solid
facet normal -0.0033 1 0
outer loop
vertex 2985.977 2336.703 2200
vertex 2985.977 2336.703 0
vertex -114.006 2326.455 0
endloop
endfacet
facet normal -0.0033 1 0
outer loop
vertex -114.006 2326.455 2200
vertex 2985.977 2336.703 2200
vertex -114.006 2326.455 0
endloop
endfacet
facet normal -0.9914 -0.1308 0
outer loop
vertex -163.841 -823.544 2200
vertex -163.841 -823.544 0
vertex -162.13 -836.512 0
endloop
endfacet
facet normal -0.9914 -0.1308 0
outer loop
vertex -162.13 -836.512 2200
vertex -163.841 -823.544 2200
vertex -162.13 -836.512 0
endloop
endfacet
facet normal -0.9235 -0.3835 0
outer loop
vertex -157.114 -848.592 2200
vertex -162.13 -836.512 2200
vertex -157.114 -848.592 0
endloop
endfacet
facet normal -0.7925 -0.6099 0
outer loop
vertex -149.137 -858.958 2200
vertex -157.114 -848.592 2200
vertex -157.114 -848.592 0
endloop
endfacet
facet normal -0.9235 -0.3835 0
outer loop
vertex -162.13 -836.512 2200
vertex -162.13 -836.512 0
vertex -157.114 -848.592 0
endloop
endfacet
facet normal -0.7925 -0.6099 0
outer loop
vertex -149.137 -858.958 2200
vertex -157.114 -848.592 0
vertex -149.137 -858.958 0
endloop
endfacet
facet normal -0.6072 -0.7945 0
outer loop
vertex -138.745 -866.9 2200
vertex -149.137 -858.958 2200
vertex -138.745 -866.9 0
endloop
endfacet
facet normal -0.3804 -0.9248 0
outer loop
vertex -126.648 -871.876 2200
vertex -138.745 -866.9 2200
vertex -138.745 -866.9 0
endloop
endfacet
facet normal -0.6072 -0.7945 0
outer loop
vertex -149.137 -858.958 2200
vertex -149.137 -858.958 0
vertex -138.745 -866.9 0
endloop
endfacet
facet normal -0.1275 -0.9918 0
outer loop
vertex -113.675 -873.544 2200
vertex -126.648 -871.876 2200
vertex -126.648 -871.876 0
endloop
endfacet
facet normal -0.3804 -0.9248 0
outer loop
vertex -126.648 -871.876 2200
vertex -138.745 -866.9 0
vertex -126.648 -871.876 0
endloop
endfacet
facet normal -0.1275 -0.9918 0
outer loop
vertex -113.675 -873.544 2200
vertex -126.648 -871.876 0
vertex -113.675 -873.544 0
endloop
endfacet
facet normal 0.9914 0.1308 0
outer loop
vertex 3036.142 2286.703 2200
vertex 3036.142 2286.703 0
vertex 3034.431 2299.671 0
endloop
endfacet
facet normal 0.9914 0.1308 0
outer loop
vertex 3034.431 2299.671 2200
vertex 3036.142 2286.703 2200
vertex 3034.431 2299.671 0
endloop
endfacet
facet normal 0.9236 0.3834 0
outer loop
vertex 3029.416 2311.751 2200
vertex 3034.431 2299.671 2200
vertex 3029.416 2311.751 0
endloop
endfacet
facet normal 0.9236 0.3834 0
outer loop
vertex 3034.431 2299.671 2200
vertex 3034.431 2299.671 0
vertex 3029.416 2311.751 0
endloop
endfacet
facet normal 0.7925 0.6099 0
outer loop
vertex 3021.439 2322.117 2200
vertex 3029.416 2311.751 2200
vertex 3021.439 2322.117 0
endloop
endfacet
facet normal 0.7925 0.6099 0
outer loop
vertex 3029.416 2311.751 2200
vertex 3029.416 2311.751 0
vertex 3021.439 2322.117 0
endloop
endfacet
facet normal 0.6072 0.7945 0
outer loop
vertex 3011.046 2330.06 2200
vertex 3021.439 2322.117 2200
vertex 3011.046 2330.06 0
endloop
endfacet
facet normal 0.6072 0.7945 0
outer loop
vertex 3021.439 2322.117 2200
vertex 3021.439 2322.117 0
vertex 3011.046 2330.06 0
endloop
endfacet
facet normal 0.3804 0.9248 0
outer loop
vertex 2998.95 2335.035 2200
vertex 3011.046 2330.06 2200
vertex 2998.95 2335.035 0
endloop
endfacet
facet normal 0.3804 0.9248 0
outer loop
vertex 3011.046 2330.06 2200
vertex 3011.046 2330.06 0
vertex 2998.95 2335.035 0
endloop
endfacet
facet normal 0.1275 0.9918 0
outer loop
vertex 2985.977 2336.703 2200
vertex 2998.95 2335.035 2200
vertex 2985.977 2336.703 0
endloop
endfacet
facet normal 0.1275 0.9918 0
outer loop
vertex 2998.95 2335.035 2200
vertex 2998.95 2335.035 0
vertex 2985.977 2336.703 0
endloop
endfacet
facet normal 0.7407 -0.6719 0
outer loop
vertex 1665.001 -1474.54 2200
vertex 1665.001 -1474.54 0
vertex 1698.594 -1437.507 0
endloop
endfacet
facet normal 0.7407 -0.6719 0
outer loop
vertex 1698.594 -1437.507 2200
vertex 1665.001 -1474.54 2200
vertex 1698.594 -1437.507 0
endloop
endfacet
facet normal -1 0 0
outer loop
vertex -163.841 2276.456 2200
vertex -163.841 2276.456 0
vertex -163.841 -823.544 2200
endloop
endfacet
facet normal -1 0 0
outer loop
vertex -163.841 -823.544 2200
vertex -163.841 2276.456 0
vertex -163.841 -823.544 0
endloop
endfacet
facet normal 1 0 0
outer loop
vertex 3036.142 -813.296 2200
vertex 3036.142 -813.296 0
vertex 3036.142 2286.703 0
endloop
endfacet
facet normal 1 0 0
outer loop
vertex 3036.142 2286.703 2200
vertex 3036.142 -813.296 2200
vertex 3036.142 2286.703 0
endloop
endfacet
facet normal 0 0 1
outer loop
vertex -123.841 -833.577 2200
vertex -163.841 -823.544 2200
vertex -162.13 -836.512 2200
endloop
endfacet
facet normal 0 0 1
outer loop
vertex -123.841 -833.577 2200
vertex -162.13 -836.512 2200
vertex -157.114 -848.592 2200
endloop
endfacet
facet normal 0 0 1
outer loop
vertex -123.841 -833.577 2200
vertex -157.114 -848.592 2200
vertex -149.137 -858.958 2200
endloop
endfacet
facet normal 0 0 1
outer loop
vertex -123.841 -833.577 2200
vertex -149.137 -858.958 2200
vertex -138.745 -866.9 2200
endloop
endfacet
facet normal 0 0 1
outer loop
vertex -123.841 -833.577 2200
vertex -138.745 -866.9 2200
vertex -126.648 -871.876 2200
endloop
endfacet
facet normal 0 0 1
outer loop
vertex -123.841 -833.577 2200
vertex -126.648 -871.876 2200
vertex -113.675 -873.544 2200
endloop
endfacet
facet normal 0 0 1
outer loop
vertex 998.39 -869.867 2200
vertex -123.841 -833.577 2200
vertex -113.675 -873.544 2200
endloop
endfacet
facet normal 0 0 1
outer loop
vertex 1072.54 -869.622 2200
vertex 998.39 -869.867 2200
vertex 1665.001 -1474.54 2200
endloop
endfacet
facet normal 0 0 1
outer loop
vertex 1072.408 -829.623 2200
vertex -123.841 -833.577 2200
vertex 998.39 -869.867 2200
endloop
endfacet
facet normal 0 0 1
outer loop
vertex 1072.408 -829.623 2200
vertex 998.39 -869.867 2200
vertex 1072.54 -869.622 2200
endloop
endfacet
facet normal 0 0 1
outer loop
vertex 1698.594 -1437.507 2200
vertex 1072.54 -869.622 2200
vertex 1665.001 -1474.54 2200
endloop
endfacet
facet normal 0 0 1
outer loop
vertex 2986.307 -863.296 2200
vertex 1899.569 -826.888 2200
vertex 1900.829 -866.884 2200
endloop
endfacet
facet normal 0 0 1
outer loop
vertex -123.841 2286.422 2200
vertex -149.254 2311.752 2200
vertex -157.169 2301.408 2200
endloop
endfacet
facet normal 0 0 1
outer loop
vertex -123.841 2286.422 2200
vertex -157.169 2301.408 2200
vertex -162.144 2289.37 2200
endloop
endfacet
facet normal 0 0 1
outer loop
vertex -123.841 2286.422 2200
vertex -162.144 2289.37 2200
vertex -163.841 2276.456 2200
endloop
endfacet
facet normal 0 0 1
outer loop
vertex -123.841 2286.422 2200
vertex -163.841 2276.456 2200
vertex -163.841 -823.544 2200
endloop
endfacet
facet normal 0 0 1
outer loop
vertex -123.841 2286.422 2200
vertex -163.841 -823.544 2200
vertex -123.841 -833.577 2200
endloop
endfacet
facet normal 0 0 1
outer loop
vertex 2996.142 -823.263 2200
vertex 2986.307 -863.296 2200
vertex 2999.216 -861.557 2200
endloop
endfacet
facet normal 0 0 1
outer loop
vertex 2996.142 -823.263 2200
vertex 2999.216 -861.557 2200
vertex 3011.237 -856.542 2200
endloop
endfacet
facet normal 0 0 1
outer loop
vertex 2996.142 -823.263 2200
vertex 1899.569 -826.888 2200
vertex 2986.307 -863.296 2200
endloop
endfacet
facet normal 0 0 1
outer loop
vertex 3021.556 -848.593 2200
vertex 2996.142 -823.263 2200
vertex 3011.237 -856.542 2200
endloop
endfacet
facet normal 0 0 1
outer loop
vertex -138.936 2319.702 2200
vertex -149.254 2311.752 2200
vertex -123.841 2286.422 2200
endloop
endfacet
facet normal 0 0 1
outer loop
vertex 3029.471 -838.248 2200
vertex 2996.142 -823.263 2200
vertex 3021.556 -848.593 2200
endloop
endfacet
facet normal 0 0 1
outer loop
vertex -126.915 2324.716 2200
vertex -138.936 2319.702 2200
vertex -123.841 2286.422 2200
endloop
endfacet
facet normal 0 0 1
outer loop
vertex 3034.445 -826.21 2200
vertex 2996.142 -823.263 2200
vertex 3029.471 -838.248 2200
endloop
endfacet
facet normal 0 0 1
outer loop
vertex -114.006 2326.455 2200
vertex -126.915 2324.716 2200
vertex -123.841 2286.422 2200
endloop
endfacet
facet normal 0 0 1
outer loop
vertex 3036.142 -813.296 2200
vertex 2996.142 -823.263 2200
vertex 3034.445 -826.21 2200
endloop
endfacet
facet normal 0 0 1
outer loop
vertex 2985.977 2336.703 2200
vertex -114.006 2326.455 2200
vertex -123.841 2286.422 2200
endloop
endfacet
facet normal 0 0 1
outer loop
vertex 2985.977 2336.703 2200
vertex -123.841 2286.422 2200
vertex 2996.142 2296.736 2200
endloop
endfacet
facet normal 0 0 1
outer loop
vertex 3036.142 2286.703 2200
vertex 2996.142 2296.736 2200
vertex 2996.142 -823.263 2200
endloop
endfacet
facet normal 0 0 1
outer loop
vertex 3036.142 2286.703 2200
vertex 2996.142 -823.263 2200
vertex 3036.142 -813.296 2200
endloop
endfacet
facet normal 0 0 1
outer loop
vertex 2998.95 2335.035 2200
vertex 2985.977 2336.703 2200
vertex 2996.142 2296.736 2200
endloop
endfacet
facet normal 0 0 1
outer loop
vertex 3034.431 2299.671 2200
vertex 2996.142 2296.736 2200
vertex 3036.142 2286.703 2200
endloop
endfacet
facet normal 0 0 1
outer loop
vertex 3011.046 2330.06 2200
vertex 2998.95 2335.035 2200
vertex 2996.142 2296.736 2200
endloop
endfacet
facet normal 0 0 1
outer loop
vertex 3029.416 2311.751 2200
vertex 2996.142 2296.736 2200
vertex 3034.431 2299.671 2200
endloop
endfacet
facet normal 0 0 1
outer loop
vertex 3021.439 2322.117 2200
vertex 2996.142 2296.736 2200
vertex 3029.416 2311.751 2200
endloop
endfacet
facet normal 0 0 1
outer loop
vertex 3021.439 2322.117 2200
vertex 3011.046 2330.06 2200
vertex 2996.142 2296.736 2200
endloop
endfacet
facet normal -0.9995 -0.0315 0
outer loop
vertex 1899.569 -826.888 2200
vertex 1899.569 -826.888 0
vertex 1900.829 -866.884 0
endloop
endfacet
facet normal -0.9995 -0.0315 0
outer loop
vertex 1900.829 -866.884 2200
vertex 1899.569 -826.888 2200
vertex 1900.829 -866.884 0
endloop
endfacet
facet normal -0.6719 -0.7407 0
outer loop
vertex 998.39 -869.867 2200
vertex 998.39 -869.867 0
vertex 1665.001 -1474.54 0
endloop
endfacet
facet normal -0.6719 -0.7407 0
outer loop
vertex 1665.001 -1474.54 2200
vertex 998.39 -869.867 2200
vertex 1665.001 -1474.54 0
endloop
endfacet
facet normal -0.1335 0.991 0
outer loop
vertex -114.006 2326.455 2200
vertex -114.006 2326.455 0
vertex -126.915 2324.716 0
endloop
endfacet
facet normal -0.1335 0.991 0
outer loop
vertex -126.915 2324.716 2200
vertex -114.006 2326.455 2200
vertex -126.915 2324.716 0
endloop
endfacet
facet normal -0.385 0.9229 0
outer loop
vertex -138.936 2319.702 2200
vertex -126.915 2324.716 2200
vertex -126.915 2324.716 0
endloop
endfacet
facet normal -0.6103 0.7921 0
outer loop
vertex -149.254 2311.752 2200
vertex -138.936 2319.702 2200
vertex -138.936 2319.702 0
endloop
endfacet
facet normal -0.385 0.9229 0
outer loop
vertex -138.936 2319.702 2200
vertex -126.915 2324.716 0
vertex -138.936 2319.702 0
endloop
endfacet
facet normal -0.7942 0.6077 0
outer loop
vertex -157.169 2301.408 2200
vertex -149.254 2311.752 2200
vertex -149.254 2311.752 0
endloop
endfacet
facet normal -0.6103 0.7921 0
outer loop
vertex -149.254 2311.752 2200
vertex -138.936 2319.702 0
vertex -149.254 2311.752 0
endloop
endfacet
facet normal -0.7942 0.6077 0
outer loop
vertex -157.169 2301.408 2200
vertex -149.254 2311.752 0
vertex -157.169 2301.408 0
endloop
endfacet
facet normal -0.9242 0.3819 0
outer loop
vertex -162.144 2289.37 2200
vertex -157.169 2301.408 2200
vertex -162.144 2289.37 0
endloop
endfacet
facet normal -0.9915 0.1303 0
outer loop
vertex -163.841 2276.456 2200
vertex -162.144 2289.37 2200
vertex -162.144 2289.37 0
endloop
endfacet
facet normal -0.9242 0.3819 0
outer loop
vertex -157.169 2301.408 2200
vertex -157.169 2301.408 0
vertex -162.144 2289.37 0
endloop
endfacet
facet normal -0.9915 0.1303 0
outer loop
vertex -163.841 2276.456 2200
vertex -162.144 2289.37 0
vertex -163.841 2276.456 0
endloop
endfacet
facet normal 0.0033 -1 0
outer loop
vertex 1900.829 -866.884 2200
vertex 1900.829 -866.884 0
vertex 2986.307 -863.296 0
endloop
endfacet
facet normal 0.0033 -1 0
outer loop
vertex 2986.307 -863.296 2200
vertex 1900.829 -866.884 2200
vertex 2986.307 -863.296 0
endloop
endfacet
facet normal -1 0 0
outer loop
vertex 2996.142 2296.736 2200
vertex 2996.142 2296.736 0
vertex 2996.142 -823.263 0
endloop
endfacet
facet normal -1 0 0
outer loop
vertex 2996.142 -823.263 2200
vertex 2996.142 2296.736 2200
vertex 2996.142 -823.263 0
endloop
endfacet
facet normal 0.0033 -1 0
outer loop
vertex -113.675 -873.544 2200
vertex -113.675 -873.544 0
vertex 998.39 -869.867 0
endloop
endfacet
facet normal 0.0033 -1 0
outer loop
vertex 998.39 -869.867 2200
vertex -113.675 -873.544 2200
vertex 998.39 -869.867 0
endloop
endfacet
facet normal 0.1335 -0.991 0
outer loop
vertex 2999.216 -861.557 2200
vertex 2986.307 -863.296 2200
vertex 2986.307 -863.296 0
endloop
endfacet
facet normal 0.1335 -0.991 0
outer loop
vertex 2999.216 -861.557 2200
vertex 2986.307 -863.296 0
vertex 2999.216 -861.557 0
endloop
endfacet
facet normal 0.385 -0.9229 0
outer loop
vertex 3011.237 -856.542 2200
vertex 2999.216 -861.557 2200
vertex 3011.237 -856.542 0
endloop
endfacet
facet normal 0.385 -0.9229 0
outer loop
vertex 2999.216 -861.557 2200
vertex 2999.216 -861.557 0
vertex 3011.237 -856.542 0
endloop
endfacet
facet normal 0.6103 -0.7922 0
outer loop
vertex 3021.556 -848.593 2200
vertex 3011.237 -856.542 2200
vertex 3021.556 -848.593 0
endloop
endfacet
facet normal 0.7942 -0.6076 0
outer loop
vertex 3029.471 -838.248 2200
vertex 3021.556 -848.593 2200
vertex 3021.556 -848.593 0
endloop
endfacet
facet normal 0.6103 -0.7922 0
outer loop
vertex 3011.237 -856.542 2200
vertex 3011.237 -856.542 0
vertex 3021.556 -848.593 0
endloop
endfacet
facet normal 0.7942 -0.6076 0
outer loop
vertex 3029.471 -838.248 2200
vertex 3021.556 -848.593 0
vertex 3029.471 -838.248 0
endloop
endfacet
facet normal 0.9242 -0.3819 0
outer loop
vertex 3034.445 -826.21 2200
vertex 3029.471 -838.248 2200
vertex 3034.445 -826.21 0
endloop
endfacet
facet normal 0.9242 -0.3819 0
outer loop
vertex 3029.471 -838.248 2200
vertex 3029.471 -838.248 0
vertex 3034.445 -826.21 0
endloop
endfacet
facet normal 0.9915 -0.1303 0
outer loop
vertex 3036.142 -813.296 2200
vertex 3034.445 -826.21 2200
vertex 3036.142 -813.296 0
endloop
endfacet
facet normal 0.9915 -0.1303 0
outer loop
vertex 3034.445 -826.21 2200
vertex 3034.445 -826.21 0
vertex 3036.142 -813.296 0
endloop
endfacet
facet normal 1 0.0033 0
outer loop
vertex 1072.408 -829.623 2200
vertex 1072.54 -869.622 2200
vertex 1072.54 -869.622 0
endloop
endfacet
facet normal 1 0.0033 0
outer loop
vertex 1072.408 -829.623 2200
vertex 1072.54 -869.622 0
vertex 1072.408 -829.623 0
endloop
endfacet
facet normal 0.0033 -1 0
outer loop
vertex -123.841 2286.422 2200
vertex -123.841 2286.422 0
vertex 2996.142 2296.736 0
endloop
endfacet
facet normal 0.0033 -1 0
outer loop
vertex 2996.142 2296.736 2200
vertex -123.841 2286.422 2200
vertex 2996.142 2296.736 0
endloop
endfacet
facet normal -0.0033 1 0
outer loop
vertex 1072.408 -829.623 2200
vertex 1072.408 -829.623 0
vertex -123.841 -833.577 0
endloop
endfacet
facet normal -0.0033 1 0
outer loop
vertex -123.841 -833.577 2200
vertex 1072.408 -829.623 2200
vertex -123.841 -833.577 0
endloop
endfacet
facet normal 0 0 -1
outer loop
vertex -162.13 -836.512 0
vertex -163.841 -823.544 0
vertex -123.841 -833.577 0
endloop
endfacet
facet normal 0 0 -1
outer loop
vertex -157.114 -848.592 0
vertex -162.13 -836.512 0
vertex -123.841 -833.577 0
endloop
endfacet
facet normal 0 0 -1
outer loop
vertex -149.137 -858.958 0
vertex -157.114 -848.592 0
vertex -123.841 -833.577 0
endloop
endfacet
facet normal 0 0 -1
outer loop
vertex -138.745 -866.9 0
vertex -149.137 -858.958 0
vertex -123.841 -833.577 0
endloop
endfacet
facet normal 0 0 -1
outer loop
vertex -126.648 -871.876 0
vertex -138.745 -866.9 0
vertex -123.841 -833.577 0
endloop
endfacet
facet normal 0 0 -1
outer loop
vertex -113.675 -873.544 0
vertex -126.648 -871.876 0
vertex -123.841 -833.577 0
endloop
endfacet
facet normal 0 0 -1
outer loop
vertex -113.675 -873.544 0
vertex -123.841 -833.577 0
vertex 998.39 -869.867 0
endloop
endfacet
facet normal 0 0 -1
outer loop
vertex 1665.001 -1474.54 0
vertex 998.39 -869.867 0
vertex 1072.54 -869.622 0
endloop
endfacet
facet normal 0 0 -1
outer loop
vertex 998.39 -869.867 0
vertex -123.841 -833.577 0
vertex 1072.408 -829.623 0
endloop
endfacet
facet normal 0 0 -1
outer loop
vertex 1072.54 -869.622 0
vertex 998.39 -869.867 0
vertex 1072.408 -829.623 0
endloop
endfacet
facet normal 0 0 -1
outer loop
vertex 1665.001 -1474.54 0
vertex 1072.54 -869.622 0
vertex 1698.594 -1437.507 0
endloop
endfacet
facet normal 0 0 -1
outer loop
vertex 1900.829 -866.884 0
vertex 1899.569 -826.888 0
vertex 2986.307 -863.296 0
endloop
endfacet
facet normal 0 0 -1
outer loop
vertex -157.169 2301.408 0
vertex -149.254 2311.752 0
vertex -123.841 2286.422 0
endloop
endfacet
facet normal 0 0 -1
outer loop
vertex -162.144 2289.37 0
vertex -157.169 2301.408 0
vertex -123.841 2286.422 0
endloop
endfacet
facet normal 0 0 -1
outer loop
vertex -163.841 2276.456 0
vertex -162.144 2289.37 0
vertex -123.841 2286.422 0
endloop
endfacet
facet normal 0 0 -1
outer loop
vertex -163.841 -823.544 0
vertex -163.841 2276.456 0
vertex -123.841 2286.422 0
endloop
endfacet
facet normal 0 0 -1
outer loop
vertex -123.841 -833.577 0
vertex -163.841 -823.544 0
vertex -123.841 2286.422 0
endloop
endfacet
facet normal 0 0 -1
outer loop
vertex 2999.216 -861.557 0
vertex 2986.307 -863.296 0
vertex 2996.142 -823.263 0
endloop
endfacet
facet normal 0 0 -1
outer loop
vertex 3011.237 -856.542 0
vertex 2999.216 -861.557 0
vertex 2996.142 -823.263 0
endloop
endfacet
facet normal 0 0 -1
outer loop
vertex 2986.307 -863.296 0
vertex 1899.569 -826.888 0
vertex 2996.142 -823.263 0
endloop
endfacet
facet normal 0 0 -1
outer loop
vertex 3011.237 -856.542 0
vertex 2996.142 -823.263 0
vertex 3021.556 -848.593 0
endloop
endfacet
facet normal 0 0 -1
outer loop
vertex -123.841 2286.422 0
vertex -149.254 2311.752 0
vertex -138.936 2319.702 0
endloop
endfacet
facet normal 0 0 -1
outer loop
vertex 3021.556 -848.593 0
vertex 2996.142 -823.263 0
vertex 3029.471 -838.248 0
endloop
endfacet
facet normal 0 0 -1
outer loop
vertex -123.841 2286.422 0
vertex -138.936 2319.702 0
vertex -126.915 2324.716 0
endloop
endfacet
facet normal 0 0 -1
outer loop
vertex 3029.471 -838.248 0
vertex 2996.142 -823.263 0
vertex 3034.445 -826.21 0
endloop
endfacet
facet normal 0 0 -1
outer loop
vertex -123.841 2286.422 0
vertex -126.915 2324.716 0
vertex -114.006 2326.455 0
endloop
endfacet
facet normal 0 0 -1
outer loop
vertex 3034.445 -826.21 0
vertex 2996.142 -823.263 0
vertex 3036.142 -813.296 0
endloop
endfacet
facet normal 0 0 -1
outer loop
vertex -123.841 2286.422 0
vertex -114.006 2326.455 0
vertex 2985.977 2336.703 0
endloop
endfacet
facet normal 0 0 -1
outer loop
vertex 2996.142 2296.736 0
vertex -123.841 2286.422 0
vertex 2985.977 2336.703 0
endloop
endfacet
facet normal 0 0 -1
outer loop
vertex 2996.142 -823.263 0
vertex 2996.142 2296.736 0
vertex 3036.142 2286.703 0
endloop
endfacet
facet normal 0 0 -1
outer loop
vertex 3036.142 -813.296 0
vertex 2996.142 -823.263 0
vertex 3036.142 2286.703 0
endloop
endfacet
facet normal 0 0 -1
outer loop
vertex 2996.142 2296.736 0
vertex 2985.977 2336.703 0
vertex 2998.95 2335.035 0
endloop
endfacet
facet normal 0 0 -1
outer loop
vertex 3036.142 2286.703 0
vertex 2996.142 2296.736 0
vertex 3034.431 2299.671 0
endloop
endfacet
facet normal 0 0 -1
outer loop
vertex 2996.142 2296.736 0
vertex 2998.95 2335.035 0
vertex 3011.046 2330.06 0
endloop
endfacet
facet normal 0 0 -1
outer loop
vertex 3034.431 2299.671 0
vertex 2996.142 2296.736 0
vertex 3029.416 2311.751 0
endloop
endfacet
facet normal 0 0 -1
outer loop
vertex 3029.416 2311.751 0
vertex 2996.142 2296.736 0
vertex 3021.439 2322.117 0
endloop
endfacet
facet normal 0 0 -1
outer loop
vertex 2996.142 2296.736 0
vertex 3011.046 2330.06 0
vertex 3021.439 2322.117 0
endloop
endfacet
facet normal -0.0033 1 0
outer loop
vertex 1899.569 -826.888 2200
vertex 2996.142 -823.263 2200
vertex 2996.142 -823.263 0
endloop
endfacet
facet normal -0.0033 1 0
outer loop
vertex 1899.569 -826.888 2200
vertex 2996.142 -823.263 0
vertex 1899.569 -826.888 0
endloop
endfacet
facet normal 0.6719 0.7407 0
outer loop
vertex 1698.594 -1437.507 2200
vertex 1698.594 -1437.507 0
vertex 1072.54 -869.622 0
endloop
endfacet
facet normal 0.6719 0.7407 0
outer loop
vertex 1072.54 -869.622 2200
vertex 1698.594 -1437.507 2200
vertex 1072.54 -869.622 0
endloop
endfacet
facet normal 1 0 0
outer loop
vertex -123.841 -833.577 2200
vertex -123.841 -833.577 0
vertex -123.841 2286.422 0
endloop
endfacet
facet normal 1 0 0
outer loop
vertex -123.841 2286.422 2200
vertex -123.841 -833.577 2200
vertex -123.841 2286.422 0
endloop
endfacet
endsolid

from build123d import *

# Parameters (mm, degrees)
F1_DEPTH = 2200


with BuildPart() as f1:
    # F0 (on Top) → F1 (new body)
    with BuildSketch(Plane.XY):
        with BuildLine():
            ThreePointArc((-114.00585, 2326.455229), (-149.254291, 2311.752355), (-163.840562, 2276.455502))
            Line((-163.840562, 2276.455502), (-163.840562, -823.543952))
            ThreePointArc((-163.840562, -823.543952), (-149.137415, -858.957681), (-113.675274, -873.543678))
            Line((-113.675274, -873.543678), (998.390225, -869.867441))
            Line((998.390225, -869.867441), (1665.001438, -1474.540486))
            Line((1665.001438, -1474.540486), (1698.594385, -1437.50653))
            Line((1698.594385, -1437.50653), (1072.540377, -869.622317))
            Line((1072.540377, -869.622317), (1072.408147, -829.622536))
            Line((1072.408147, -829.622536), (-123.840562, -833.577064))
            Line((-123.840562, -833.577064), (-123.840562, 2286.422499))
            Line((-123.840562, 2286.422499), (2996.141953, 2296.736457))
            Line((2996.141953, 2296.736457), (2996.141953, -823.263105))
            Line((2996.141953, -823.263105), (1899.56921, -826.888128))
            Line((1899.56921, -826.888128), (1900.828944, -866.884182))
            Line((1900.828944, -866.884182), (2986.307241, -863.295835))
            ThreePointArc((2986.307241, -863.295835), (3021.555682, -848.592961), (3036.141953, -813.296109))
            Line((3036.141953, -813.296109), (3036.141953, 2286.703345))
            ThreePointArc((3036.141953, 2286.703345), (3021.438806, 2322.117074), (2985.976665, 2336.703072))
            Line((2985.976665, 2336.703072), (-114.00585, 2326.455229))
        make_face()
    extrude(amount=F1_DEPTH)


solid = f1.part
